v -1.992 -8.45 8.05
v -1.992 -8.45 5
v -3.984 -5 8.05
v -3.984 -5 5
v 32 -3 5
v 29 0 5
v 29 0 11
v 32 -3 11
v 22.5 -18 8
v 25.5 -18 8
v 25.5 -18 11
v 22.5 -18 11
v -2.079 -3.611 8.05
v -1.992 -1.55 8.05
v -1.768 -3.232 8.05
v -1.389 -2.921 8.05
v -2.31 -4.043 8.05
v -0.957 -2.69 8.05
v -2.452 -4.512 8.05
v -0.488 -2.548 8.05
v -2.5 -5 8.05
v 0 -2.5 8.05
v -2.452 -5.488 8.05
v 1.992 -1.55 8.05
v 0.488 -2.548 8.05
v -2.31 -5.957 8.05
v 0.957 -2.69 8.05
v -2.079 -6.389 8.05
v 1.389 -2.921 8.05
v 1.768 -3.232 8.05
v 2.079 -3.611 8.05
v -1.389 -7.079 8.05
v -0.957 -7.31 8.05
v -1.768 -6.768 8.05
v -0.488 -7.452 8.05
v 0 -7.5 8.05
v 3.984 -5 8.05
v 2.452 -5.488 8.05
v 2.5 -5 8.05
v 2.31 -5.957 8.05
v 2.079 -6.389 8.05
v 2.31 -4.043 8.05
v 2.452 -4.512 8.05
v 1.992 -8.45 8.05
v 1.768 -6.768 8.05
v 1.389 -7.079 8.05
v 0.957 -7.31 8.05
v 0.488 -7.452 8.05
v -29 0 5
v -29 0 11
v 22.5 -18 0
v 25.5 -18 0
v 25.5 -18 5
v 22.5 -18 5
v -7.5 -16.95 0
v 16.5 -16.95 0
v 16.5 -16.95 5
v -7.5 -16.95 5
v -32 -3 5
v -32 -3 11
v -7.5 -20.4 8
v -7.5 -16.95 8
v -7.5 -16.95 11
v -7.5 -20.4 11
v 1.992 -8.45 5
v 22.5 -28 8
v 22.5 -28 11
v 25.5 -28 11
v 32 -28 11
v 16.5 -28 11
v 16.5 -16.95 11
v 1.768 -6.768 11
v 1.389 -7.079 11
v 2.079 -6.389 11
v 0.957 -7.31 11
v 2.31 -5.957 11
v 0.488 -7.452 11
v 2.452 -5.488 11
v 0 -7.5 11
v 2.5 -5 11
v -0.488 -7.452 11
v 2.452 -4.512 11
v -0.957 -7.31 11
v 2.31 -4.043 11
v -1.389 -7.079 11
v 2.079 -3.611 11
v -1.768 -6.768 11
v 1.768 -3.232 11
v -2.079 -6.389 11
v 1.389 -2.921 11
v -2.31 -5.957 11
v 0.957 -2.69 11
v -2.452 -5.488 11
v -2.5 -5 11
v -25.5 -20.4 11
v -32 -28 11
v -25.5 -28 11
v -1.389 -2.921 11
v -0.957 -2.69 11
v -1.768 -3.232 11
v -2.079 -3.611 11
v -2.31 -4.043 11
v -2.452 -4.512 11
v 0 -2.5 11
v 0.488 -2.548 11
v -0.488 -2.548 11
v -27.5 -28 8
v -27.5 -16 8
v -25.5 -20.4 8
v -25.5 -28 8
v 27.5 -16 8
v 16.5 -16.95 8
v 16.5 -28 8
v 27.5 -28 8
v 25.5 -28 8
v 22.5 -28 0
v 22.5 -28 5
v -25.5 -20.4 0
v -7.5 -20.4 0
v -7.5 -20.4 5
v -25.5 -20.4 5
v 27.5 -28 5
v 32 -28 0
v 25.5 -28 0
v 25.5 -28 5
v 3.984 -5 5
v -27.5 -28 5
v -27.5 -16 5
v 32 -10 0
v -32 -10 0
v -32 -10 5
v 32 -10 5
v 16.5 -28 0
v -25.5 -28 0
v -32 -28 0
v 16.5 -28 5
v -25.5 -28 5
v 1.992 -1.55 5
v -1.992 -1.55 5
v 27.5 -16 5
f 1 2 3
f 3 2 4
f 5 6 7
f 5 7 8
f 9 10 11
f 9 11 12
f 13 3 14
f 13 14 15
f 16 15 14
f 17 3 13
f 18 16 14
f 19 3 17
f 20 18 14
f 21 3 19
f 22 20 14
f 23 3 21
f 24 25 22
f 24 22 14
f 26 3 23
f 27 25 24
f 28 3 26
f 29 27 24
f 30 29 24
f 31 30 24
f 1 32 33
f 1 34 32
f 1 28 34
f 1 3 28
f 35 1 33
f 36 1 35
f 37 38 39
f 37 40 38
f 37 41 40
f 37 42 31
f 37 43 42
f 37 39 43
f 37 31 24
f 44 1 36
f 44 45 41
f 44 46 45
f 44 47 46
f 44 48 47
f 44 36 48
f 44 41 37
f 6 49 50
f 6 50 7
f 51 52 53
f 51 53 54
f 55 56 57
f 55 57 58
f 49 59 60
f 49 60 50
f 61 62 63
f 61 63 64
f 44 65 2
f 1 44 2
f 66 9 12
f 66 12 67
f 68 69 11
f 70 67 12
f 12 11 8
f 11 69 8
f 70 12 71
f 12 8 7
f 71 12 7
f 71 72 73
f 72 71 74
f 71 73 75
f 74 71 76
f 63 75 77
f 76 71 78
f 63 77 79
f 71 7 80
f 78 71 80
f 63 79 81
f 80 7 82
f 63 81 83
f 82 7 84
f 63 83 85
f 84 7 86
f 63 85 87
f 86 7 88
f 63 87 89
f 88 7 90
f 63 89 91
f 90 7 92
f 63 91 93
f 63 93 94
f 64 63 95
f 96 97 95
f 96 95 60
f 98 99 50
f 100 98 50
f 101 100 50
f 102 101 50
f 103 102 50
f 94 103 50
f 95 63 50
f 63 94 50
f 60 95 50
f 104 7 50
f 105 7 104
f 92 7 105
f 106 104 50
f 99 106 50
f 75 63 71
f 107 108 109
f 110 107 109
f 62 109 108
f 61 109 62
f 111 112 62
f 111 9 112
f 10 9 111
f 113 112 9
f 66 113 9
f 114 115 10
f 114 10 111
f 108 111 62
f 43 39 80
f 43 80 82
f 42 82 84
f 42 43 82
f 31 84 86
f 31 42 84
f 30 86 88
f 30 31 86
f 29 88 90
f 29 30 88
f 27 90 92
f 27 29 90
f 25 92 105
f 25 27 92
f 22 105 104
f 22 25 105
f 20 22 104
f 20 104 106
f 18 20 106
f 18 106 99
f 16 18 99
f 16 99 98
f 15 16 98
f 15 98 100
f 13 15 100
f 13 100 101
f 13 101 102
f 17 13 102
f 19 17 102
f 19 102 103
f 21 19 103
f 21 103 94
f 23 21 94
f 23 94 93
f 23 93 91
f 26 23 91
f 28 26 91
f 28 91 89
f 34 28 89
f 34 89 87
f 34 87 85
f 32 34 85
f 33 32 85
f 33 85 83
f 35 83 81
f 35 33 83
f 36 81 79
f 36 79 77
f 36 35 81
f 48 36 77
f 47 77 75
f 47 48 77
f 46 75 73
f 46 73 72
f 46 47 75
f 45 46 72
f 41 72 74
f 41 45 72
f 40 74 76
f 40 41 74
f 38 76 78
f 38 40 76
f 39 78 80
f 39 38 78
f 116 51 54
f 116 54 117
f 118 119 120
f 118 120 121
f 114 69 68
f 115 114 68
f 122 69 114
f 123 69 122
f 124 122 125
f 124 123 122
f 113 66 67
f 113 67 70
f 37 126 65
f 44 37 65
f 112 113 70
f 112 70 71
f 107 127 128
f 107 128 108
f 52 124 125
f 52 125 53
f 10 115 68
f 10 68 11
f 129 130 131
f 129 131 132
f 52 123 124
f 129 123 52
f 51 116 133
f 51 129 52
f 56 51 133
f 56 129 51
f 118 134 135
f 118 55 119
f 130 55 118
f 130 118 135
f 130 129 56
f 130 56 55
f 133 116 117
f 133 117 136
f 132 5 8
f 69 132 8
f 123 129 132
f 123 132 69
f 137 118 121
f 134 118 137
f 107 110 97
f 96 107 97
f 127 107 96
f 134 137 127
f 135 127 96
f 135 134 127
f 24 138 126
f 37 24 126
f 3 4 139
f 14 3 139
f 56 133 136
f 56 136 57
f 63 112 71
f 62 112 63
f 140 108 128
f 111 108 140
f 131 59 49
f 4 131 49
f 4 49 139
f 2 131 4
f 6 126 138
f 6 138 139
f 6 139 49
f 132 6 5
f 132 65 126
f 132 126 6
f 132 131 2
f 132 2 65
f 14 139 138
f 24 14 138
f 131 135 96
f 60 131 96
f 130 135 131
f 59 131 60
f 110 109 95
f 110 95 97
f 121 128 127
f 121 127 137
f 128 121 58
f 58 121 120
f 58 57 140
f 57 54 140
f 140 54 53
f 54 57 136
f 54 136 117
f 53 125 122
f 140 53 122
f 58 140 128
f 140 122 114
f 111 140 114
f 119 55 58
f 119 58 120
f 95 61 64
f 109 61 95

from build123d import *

# Parameters (mm, degrees)
SKETCH_R        = 2.5
PAD_DEPTH       = 11
SKETCH001_W     = 72.573656
SKETCH001_H     = 10
POCKET_DEPTH    = 5
POCKET001_DEPTH = 3.05
SKETCH003_W     = 55
SKETCH003_H     = 3
POCKET002_DEPTH = 12


with BuildPart() as part:
    # Sketch → Pad (new body)
    with BuildSketch(Plane.XY):
        Polygon((-32, -28), (-32, -3), (-29, 0), (29, 0), (32, -3), (32, -28), (25.5, -28), (25.5, -18), (22.5, -18), (22.5, -28), (16.5, -28), (16.5, -16.95), (-7.5, -16.95), (-7.5, -20.4), (-25.5, -20.4), (-25.5, -28), align=None)
        with Locations((0, -5)):
            Circle(SKETCH_R, mode=Mode.SUBTRACT)
    extrude(amount=PAD_DEPTH)

    # Sketch001 (on Face18 of Pad) → Pocket (cut)
    with BuildSketch(Plane(origin=(0, 0, 0), x_dir=(1, 0, 0), z_dir=(0, 0, -1))):
        with Locations((0, 5)):
            Rectangle(SKETCH001_W, SKETCH001_H)
    extrude(amount=-POCKET_DEPTH, mode=Mode.SUBTRACT)

    # Sketch002 (on Face4 of Pocket) → Pocket001 (cut)
    with BuildSketch(Plane(origin=(0, 0, 5), x_dir=(1, 0, 0), z_dir=(0, 0, -1))):
        Polygon((3.983717, 5), (1.991858, 8.45), (-1.991858, 8.45), (-3.983717, 5), (-1.991858, 1.55), (1.991858, 1.55), align=None)
    extrude(amount=-POCKET001_DEPTH, mode=Mode.SUBTRACT)

    # Sketch003 (on Face17 of Pocket001) → Pocket002 (cut)
    with BuildSketch(Plane.XZ.offset(28)):
        with Locations((0, 6.5)):
            Rectangle(SKETCH003_W, SKETCH003_H)
    extrude(amount=-POCKET002_DEPTH, mode=Mode.SUBTRACT)


solid = part.part
